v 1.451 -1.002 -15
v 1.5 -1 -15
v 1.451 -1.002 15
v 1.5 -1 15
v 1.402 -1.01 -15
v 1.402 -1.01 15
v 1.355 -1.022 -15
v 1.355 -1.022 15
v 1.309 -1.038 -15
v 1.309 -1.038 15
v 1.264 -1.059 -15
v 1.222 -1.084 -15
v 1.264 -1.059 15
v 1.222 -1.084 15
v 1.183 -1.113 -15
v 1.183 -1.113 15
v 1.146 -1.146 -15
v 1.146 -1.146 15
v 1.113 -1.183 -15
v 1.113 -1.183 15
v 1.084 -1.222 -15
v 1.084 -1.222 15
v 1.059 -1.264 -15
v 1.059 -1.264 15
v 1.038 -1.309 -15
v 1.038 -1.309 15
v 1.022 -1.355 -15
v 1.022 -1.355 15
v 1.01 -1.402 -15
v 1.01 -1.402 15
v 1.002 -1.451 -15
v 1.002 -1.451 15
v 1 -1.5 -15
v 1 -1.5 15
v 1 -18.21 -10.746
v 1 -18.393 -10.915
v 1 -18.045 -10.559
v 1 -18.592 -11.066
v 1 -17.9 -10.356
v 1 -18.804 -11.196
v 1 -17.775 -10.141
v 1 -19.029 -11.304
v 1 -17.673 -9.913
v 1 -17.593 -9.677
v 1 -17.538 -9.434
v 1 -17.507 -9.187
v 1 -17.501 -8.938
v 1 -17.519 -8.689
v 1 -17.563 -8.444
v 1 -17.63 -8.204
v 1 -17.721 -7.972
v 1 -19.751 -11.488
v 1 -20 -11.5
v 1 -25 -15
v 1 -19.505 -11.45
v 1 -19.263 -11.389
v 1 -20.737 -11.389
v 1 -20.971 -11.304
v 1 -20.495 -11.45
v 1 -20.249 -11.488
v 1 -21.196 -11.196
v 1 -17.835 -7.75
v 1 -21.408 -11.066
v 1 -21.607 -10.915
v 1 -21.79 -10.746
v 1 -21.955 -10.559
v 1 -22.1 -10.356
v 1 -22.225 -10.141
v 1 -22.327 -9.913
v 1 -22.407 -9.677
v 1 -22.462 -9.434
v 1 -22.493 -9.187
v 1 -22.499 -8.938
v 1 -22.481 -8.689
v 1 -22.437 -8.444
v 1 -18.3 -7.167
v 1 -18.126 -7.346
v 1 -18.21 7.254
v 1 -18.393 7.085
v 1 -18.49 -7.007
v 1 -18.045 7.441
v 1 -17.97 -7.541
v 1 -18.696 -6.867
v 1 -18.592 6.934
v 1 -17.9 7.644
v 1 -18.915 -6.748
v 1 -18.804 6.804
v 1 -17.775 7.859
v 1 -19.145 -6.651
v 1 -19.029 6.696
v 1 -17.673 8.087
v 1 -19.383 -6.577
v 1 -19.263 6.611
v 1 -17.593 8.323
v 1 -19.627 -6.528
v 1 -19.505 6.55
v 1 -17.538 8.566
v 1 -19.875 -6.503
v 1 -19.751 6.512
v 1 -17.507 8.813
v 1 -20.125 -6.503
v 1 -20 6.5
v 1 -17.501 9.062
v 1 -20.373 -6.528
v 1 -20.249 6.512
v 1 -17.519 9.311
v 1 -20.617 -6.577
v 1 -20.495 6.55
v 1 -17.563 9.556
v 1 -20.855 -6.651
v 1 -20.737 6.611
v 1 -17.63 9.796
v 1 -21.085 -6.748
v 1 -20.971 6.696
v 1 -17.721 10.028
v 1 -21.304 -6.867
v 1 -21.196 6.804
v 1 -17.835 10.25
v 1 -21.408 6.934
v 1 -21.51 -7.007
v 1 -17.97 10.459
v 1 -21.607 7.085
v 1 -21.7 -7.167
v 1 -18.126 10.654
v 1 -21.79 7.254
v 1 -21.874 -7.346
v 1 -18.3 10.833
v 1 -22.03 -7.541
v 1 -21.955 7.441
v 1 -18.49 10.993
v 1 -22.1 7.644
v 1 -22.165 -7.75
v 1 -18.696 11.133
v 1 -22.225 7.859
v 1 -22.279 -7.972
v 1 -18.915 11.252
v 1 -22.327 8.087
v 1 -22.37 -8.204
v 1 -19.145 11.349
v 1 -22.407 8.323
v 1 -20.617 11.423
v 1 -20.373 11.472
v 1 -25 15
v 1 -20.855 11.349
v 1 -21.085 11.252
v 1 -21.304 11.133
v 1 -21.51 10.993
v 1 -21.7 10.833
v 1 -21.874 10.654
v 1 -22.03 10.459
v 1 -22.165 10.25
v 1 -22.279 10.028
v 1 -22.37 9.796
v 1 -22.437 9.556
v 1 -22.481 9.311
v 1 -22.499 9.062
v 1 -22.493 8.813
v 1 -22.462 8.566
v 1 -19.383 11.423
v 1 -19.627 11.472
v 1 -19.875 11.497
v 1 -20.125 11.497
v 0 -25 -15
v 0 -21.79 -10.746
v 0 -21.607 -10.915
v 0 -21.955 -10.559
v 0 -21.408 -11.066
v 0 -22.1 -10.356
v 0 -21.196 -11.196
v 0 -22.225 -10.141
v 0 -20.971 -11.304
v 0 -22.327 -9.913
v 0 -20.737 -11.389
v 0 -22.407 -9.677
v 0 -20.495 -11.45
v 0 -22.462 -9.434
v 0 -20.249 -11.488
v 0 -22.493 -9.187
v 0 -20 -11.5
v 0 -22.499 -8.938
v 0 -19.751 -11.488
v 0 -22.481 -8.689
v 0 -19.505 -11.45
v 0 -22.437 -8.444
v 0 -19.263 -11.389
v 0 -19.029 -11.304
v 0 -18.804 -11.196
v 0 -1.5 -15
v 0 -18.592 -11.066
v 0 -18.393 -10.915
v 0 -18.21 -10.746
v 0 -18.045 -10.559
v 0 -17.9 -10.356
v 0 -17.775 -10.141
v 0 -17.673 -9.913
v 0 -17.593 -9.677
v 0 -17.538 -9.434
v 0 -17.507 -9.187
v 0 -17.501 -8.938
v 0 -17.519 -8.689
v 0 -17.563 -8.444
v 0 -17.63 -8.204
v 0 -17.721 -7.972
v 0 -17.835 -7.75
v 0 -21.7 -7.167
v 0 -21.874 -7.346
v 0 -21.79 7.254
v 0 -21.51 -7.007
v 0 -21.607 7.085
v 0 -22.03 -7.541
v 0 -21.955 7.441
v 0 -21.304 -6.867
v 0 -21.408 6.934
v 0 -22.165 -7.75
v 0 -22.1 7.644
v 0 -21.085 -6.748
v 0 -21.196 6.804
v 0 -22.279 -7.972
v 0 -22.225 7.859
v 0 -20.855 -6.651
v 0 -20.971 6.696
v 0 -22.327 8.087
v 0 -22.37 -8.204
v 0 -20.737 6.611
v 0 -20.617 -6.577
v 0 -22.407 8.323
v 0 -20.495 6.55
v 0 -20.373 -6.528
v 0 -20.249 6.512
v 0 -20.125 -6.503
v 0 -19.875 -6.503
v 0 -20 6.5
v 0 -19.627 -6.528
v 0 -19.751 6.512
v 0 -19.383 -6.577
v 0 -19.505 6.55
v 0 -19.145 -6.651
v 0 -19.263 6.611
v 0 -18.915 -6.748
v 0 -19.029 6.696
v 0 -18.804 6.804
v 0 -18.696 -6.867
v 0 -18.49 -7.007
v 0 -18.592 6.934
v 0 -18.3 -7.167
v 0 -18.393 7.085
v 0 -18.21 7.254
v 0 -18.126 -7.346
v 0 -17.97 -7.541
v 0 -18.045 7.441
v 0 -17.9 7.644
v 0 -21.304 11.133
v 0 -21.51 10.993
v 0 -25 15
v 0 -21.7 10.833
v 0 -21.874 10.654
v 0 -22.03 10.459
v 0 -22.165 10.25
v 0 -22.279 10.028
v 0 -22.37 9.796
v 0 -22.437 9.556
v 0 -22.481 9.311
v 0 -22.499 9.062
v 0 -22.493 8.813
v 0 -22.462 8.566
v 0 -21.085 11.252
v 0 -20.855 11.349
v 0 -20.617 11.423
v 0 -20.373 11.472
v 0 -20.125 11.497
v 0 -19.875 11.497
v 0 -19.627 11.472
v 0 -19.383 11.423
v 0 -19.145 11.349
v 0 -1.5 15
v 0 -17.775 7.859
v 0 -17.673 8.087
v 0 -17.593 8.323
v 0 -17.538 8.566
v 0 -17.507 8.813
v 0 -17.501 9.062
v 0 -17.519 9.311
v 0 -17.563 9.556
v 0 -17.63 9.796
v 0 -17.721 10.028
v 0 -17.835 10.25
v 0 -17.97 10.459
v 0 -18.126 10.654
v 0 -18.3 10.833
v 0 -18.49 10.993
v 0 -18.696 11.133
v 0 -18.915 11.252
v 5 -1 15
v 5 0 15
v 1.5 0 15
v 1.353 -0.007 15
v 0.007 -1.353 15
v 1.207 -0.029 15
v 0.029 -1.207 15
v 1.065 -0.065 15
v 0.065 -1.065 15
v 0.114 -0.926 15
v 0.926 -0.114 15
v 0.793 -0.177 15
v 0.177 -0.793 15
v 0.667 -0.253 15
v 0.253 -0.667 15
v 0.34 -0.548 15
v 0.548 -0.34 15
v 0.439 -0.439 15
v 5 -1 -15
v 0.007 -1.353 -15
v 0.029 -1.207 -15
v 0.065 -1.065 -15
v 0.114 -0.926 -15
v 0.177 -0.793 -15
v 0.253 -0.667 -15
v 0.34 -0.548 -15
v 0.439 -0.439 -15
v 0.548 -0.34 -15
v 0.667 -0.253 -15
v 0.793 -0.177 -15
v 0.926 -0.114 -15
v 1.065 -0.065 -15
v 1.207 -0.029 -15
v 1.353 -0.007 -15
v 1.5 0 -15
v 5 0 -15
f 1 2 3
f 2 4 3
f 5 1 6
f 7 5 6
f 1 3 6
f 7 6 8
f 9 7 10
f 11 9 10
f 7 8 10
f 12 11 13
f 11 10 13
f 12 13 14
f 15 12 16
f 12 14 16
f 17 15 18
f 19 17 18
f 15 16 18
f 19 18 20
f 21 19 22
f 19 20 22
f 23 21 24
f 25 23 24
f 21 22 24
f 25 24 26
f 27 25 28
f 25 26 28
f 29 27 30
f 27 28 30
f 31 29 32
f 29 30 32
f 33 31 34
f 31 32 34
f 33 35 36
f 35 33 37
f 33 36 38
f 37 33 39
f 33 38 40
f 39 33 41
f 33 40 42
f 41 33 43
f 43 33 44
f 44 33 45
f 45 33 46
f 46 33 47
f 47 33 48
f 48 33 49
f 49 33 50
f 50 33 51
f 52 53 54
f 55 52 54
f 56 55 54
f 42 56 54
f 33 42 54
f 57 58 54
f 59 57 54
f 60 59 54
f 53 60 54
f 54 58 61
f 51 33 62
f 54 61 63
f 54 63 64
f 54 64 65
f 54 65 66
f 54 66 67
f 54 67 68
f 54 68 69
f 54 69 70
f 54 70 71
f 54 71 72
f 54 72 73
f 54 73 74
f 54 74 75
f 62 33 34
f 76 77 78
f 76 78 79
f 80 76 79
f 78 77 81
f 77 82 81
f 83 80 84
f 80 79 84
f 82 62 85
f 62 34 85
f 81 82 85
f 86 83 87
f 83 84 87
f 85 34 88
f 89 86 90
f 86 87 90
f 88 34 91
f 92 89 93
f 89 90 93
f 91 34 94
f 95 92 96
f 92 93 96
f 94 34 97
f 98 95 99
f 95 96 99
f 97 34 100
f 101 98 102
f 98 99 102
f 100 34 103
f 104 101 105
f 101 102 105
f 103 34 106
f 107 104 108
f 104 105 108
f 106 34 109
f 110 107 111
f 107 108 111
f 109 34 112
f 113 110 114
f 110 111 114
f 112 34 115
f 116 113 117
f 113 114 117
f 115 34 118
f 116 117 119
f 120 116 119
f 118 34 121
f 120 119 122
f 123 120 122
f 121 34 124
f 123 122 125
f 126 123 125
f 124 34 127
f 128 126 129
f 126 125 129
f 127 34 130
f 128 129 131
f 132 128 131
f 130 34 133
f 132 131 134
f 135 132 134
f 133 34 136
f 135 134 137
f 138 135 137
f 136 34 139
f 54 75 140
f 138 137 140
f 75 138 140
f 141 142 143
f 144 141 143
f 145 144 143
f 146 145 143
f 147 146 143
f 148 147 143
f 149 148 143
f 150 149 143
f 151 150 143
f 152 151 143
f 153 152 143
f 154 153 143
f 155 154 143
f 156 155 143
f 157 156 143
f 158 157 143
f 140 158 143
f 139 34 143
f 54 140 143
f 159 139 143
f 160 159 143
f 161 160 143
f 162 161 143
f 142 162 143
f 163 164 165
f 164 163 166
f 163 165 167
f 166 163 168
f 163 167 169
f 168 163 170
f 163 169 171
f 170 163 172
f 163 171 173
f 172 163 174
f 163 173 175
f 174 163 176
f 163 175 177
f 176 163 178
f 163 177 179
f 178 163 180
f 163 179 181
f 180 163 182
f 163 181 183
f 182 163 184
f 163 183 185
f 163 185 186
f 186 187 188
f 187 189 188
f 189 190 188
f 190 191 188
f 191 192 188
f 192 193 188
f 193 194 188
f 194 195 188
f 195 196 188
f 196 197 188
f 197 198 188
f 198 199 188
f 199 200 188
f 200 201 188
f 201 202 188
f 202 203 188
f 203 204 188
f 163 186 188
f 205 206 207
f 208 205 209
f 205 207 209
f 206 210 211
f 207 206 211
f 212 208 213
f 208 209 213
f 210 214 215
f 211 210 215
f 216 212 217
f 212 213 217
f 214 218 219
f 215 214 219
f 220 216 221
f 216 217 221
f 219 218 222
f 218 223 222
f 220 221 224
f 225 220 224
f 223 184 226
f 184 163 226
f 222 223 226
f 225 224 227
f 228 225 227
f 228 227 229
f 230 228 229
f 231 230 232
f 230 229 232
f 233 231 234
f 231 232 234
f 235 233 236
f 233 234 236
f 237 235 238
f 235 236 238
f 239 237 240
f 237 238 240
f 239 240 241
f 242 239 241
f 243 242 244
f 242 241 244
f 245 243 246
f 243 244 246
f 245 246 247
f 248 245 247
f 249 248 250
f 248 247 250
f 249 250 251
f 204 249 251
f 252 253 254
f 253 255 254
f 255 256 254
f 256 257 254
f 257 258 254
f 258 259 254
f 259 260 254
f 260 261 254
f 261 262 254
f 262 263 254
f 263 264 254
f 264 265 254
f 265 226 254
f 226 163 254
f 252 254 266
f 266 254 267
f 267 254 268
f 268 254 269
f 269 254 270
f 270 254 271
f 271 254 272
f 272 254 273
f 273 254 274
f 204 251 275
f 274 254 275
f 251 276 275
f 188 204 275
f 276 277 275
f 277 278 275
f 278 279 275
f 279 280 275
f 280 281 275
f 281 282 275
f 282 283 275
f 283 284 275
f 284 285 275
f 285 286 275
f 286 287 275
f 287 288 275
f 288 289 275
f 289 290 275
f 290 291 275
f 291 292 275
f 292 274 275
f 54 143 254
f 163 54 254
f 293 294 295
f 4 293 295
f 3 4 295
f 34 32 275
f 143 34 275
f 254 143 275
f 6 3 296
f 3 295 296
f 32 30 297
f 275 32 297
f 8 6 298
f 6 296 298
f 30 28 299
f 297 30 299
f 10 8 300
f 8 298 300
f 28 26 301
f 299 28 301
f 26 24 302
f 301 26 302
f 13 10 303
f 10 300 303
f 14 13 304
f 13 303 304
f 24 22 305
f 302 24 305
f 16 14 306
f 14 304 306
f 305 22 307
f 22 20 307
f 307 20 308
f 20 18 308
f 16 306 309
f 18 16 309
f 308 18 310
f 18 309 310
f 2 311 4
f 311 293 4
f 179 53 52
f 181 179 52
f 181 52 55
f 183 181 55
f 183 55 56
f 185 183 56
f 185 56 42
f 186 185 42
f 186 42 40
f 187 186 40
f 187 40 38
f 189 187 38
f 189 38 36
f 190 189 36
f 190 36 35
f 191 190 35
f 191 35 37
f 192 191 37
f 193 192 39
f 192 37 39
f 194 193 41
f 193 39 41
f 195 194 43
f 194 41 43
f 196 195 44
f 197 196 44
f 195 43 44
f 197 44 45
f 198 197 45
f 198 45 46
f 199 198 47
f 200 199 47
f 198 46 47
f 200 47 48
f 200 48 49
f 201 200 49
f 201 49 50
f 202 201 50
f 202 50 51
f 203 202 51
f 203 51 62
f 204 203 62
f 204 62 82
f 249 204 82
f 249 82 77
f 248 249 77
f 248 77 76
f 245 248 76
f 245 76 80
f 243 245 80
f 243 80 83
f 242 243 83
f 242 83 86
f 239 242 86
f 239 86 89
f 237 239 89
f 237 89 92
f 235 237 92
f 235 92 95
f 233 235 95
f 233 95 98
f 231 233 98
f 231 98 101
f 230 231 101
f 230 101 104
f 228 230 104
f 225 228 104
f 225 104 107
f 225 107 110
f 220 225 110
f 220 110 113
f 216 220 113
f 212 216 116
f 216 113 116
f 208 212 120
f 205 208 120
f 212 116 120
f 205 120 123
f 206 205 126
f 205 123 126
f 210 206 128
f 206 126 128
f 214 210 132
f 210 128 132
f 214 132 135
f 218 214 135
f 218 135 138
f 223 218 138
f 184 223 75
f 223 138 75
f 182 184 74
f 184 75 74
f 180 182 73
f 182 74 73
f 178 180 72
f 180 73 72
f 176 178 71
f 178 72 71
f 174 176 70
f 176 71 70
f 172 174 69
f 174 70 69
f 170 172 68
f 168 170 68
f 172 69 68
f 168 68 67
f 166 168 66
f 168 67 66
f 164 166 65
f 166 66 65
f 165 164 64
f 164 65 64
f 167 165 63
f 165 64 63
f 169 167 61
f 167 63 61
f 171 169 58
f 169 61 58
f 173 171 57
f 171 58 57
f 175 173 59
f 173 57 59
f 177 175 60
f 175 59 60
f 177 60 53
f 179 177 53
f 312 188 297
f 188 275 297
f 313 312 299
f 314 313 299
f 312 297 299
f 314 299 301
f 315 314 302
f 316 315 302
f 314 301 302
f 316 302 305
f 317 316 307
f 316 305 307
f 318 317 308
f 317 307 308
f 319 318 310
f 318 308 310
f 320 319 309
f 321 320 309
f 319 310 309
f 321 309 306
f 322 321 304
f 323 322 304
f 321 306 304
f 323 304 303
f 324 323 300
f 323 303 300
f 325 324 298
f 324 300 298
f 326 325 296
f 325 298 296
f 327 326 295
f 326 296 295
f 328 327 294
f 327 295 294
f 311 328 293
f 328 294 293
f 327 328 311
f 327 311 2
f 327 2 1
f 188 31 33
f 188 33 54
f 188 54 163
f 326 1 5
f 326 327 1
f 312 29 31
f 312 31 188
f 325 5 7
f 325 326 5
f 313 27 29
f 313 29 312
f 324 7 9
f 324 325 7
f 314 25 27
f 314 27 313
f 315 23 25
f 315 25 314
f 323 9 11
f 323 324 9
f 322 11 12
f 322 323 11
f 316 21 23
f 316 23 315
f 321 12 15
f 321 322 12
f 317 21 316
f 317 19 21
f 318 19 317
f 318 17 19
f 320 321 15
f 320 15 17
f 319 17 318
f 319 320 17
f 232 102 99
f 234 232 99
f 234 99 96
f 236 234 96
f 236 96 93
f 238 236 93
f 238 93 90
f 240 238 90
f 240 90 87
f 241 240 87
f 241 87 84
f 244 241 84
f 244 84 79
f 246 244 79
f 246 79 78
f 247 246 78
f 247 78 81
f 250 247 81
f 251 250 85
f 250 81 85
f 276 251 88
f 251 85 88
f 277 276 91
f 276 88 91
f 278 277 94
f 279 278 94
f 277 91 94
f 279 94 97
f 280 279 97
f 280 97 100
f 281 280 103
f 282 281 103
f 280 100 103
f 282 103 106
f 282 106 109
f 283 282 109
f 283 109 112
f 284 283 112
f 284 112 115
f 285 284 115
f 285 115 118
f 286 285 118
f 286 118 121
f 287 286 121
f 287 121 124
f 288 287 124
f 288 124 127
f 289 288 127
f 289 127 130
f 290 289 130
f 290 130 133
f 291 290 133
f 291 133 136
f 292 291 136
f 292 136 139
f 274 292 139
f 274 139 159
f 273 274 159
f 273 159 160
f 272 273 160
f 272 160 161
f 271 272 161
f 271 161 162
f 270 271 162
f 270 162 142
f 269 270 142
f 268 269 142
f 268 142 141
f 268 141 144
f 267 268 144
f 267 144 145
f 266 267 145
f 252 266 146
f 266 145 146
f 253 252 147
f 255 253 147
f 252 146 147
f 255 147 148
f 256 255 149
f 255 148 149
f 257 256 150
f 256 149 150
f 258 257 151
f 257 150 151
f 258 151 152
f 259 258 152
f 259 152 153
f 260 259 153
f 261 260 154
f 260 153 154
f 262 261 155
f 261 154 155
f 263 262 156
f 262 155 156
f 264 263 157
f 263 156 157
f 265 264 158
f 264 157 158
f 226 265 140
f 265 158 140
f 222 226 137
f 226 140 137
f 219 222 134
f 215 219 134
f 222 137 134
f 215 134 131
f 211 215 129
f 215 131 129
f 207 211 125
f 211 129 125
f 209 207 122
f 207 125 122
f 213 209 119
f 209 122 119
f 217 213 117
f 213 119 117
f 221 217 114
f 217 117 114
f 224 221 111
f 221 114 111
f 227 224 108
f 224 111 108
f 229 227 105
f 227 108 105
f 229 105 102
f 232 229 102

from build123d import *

# Parameters (mm, degrees)
SM_BASE_FLANGE_1_DEPTH = 15
CUT_EXTRUDE_1_REACH    = 31.428
SKETCH_3_R             = 2.5


# Sheet-metal steps are written as plain solids
with BuildPart() as part:
    # Sketch 1 → 基体-法兰1 (new, symmetric)
    with BuildSketch(Plane.XY):
        with BuildLine():
            Line((0, -25), (0, -1.5))
            ThreePointArc((0, -1.5), (0.439339828, -0.439339828), (1.5, 0))
            Line((1.5, 0), (5, 0))
            Line((5, 0), (5, -1))
            Line((5, -1), (1.5, -1))
            ThreePointArc((1.5, -1), (1.146446609, -1.146446609), (1, -1.5))
            Line((1, -1.5), (1, -25))
            Line((1, -25), (0, -25))
        make_face()
    extrude(amount=SM_BASE_FLANGE_1_DEPTH, both=True)

    # 草图3 → 切除-拉伸1 (cut, up to next)
    with BuildSketch(Plane(origin=(1, 0, 0), x_dir=(0, 0, -1), z_dir=(1, 0, 0)), mode=Mode.PRIVATE) as cut_extrude_1_sk1:
        with Locations((-9, -20)):
            Circle(SKETCH_3_R)
    cut_extrude_1_tool1 = extrude(cut_extrude_1_sk1.sketch, amount=-CUT_EXTRUDE_1_REACH, mode=Mode.PRIVATE) & part.part
    # 草图3 → 切除-拉伸1 (cut, up to next)
    with BuildSketch(Plane(origin=(1, 0, 0), x_dir=(0, 0, -1), z_dir=(1, 0, 0)), mode=Mode.PRIVATE) as cut_extrude_1_sk2:
        with Locations((9, -20)):
            Circle(SKETCH_3_R)
    cut_extrude_1_tool2 = extrude(cut_extrude_1_sk2.sketch, amount=-CUT_EXTRUDE_1_REACH, mode=Mode.PRIVATE) & part.part
    add(cut_extrude_1_tool1.solids().sort_by_distance((1, -20, 9))[0], mode=Mode.SUBTRACT)
    add(cut_extrude_1_tool2.solids().sort_by_distance((1, -20, -9))[0], mode=Mode.SUBTRACT)


solid = part.part
